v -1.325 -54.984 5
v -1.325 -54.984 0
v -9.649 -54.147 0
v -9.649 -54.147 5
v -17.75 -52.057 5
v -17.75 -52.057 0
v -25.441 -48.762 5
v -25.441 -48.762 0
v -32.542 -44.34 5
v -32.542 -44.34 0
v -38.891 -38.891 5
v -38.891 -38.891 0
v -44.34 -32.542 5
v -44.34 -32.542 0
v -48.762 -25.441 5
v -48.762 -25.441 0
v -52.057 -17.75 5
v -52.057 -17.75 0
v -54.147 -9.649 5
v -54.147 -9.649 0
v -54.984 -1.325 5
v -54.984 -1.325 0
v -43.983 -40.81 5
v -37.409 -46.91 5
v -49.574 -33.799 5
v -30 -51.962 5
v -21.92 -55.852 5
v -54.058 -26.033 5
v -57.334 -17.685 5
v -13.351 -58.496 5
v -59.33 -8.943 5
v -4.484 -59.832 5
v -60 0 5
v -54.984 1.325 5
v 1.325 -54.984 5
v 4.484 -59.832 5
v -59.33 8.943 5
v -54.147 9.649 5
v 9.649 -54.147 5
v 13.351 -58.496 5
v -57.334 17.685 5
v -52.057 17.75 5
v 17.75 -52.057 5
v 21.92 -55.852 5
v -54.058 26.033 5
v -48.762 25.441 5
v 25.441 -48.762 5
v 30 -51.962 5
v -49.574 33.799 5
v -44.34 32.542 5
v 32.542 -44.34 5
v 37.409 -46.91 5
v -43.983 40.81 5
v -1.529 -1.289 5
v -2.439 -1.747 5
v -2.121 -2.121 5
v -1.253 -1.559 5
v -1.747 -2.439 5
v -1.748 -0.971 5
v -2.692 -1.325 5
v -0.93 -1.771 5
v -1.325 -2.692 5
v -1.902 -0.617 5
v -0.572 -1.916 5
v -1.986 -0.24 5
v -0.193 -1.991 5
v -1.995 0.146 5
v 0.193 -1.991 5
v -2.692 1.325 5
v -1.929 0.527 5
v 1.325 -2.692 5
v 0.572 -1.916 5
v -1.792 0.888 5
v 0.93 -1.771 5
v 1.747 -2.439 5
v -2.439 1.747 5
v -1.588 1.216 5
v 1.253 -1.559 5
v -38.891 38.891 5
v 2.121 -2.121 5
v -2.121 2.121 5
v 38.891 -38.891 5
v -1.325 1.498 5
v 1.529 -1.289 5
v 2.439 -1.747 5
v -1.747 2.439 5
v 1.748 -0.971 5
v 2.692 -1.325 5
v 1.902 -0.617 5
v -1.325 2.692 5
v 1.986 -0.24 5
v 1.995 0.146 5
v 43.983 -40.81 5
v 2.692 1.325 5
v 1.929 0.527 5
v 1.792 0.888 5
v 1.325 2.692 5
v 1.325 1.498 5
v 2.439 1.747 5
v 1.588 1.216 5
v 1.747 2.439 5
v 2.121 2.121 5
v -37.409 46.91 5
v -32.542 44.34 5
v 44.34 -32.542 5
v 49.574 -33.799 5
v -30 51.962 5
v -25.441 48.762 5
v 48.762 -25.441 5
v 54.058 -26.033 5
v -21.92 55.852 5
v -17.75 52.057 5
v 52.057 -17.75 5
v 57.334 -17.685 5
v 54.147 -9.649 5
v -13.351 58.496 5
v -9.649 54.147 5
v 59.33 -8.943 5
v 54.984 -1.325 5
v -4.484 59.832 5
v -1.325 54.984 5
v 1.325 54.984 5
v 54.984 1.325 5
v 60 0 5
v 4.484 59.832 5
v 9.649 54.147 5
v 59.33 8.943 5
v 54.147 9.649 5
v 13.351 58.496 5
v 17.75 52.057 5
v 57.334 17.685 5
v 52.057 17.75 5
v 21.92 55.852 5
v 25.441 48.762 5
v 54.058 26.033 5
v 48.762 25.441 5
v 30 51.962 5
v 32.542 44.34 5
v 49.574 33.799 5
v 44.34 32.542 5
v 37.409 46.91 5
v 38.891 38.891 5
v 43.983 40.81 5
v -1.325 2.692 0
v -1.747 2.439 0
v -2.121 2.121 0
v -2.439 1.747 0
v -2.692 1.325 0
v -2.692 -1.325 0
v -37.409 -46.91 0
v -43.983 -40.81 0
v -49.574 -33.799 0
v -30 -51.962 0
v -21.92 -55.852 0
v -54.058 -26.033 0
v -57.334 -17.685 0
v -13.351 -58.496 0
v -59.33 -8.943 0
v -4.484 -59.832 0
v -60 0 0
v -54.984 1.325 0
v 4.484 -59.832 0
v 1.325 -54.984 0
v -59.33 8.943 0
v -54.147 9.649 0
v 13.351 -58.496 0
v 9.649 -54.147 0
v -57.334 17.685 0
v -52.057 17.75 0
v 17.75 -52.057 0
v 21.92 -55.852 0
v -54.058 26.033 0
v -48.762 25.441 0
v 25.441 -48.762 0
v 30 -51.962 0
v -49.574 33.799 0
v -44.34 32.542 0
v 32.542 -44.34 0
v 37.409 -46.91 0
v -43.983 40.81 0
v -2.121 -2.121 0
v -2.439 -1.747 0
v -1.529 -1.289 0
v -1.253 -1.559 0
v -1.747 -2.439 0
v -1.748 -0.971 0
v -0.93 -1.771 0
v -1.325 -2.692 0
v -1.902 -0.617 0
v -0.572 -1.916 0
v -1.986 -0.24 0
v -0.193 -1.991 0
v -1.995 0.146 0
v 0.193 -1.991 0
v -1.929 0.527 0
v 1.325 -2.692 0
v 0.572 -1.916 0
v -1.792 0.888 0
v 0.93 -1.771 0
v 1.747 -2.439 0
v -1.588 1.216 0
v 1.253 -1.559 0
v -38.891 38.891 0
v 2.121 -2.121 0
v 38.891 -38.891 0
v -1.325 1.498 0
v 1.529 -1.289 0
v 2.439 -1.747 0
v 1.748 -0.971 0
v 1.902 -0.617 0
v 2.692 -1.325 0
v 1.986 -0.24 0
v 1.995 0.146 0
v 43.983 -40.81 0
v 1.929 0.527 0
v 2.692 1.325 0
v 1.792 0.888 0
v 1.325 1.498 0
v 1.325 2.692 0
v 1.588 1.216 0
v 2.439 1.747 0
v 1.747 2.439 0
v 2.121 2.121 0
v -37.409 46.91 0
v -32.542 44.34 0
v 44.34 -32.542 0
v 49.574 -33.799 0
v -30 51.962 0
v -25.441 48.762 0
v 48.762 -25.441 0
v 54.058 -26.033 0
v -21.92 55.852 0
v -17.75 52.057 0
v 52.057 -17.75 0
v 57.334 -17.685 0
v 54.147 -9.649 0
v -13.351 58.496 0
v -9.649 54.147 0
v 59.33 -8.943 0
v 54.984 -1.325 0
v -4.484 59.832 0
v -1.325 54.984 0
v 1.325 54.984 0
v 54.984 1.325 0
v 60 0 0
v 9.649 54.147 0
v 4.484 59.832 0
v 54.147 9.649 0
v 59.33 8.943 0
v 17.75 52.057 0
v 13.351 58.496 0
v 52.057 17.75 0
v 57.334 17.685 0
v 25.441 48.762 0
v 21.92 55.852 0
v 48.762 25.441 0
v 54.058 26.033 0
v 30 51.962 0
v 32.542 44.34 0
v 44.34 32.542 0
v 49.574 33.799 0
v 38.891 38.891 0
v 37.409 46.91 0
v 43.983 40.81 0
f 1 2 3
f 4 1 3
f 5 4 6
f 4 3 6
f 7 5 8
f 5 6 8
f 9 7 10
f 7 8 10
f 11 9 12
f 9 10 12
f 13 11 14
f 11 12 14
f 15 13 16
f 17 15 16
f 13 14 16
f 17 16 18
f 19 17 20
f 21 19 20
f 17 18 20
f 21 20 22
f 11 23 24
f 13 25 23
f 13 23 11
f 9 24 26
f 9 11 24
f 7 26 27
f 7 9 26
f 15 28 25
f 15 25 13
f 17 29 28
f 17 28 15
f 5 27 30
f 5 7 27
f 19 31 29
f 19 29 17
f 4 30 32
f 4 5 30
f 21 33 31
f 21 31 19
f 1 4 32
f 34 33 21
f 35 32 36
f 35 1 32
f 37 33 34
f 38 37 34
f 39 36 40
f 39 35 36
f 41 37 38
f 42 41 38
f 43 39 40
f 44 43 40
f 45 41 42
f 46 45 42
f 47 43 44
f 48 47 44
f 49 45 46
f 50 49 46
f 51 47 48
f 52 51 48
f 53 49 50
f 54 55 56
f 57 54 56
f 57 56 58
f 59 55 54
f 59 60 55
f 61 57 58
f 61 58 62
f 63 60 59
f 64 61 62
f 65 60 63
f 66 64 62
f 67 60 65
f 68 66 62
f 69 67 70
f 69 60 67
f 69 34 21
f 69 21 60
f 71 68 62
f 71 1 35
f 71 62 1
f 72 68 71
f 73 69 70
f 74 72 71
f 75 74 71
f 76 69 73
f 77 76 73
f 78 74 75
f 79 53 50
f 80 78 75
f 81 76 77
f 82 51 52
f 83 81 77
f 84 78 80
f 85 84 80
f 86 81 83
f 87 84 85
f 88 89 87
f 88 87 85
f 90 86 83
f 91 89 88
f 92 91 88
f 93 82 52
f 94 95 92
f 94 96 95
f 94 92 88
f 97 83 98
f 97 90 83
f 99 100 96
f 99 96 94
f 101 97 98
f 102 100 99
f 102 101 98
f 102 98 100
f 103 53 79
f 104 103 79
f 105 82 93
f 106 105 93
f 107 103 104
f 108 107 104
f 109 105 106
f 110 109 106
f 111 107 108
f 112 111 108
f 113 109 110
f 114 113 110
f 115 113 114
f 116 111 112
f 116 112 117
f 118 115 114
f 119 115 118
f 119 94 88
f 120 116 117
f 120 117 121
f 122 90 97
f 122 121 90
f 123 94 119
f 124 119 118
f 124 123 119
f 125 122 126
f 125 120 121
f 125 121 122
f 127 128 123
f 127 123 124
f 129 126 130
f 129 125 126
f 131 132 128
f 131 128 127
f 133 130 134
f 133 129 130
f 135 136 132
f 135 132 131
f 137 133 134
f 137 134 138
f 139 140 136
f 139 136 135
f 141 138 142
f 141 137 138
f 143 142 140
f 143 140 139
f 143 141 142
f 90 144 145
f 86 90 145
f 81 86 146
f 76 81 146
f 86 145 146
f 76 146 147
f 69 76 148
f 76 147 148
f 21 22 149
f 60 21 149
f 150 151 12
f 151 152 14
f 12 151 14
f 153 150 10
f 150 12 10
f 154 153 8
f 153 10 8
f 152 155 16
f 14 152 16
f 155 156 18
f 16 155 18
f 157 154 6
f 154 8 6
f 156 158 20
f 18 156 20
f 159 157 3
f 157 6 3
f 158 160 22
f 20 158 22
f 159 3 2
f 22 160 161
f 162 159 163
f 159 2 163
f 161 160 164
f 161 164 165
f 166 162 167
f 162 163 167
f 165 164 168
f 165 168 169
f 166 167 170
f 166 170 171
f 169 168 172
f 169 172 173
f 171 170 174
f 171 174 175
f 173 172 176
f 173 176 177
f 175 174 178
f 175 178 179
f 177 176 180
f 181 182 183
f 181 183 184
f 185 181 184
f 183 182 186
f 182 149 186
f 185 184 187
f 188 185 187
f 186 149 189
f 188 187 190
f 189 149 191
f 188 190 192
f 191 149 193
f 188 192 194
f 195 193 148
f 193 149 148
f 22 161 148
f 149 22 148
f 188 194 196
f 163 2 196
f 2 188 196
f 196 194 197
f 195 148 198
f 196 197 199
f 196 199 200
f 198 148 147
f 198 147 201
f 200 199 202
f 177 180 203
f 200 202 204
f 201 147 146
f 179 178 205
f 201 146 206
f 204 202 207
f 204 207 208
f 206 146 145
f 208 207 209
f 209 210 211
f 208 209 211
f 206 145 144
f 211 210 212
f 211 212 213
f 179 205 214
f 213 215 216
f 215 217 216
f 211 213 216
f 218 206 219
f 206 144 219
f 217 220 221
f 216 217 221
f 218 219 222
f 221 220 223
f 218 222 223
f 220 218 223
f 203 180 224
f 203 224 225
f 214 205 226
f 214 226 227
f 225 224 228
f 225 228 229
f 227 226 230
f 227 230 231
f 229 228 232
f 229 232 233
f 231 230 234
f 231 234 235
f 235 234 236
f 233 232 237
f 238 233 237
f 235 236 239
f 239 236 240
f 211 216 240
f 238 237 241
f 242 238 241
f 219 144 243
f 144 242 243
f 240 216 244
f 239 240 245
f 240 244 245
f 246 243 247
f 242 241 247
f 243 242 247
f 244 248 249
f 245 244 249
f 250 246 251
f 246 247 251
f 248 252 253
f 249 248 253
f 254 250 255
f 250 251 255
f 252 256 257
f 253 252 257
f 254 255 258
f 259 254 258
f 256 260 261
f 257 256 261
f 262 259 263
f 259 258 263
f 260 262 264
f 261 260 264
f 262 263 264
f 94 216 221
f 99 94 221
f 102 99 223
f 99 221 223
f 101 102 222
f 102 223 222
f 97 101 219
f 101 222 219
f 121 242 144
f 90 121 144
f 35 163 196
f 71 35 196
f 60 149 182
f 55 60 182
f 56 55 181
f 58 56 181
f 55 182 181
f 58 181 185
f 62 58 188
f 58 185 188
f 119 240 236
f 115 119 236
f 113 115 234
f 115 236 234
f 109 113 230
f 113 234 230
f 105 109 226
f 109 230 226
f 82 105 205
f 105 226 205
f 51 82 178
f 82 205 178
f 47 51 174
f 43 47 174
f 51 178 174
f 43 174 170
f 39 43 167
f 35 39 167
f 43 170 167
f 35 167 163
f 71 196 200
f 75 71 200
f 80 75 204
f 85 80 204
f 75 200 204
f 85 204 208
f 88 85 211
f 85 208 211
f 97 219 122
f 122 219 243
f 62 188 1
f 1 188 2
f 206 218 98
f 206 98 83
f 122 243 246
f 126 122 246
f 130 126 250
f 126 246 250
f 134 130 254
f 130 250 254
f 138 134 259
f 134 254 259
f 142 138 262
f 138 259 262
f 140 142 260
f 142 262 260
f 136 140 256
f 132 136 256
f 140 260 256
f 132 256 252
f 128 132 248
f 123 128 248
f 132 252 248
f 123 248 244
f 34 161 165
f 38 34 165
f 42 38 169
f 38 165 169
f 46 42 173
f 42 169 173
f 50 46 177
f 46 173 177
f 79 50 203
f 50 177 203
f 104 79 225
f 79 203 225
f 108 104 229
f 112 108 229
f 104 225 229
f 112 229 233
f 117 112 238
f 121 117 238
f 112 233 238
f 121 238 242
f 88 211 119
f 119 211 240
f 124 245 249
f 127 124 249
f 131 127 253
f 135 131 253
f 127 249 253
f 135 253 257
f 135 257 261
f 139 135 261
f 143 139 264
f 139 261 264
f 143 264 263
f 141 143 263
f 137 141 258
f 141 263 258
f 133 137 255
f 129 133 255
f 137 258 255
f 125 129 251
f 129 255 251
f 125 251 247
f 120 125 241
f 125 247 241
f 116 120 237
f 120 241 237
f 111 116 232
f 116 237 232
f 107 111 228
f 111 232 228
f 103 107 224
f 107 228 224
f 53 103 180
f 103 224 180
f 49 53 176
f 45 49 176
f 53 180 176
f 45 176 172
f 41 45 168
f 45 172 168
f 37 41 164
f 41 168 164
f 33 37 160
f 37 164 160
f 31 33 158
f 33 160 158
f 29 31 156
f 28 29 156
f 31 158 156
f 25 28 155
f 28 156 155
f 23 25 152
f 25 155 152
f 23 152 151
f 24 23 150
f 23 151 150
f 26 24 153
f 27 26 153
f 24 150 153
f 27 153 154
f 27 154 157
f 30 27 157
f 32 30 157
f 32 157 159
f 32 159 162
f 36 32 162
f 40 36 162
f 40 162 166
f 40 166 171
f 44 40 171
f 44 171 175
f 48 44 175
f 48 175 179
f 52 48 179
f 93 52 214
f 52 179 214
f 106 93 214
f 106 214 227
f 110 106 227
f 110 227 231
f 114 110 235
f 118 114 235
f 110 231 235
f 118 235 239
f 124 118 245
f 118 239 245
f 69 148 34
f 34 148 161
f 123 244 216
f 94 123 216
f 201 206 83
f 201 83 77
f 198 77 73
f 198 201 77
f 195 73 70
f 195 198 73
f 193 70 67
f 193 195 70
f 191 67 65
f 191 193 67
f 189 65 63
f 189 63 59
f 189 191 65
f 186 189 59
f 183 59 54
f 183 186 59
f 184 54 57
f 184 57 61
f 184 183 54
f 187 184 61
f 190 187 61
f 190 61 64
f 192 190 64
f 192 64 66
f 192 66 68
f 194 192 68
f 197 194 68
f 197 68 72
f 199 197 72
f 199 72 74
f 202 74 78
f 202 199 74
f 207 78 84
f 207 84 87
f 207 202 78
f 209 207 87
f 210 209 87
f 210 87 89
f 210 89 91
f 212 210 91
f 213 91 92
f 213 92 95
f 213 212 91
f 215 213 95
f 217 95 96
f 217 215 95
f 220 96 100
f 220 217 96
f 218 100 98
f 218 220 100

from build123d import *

# Parameters (mm, degrees)
SKETCH1_R           = 60
SKETCH1_R_2         = 3
BOSS_EXTRUDE2_DEPTH = 5


with BuildPart() as part:
    # Sketch1 → Boss-Extrude2 (new body)
    # profile 1 of 2: a face of its own
    with BuildSketch(Plane.XY):
        Circle(SKETCH1_R)
        with BuildLine():
            Line((-1.325, 54.984037456), (-1.325, 2.691537665))
            ThreePointArc((-1.325, 2.691537665), (0, 3), (1.325, 2.691537665))
            Line((1.325, 2.691537665), (1.325, 54.984037456))
            ThreePointArc((1.325, 54.984037456), (38.890872965, 38.890872965), (54.984037456, 1.325))
            Line((54.984037456, 1.325), (2.691537665, 1.325))
            ThreePointArc((2.691537665, 1.325), (2.921866954, 0.680215777), (3, 0))
            ThreePointArc((3, 0), (2.921866954, -0.680215777), (2.691537665, -1.325))
            Line((2.691537665, -1.325), (54.984037456, -1.325))
            ThreePointArc((54.984037456, -1.325), (38.890872965, -38.890872965), (1.325, -54.984037456))
            Line((1.325, -54.984037456), (1.325, -2.691537665))
            ThreePointArc((1.325, -2.691537665), (0, -3), (-1.325, -2.691537665))
            Line((-1.325, -2.691537665), (-1.325, -54.984037456))
            ThreePointArc((-1.325, -54.984037456), (-38.890872965, -38.890872965), (-54.984037456, -1.325))
            Line((-54.984037456, -1.325), (-2.691537665, -1.325))
            ThreePointArc((-2.691537665, -1.325), (-3, 0), (-2.691537665, 1.325))
            Line((-2.691537665, 1.325), (-54.984037456, 1.325))
            ThreePointArc((-54.984037456, 1.325), (-38.890872965, 38.890872965), (-1.325, 54.984037456))
        make_face(mode=Mode.SUBTRACT)
    # profile 2 of 2: a face of its own
    with BuildSketch(Plane.XY):
        Circle(SKETCH1_R_2)
        with BuildLine():
            ThreePointArc((-1.325, 1.498123827), (0, -2), (1.325, 1.498123827))
            Line((1.325, 1.498123827), (-1.325, 1.498123827))
        make_face(mode=Mode.SUBTRACT)
    extrude(amount=BOSS_EXTRUDE2_DEPTH)


solid = part.part
